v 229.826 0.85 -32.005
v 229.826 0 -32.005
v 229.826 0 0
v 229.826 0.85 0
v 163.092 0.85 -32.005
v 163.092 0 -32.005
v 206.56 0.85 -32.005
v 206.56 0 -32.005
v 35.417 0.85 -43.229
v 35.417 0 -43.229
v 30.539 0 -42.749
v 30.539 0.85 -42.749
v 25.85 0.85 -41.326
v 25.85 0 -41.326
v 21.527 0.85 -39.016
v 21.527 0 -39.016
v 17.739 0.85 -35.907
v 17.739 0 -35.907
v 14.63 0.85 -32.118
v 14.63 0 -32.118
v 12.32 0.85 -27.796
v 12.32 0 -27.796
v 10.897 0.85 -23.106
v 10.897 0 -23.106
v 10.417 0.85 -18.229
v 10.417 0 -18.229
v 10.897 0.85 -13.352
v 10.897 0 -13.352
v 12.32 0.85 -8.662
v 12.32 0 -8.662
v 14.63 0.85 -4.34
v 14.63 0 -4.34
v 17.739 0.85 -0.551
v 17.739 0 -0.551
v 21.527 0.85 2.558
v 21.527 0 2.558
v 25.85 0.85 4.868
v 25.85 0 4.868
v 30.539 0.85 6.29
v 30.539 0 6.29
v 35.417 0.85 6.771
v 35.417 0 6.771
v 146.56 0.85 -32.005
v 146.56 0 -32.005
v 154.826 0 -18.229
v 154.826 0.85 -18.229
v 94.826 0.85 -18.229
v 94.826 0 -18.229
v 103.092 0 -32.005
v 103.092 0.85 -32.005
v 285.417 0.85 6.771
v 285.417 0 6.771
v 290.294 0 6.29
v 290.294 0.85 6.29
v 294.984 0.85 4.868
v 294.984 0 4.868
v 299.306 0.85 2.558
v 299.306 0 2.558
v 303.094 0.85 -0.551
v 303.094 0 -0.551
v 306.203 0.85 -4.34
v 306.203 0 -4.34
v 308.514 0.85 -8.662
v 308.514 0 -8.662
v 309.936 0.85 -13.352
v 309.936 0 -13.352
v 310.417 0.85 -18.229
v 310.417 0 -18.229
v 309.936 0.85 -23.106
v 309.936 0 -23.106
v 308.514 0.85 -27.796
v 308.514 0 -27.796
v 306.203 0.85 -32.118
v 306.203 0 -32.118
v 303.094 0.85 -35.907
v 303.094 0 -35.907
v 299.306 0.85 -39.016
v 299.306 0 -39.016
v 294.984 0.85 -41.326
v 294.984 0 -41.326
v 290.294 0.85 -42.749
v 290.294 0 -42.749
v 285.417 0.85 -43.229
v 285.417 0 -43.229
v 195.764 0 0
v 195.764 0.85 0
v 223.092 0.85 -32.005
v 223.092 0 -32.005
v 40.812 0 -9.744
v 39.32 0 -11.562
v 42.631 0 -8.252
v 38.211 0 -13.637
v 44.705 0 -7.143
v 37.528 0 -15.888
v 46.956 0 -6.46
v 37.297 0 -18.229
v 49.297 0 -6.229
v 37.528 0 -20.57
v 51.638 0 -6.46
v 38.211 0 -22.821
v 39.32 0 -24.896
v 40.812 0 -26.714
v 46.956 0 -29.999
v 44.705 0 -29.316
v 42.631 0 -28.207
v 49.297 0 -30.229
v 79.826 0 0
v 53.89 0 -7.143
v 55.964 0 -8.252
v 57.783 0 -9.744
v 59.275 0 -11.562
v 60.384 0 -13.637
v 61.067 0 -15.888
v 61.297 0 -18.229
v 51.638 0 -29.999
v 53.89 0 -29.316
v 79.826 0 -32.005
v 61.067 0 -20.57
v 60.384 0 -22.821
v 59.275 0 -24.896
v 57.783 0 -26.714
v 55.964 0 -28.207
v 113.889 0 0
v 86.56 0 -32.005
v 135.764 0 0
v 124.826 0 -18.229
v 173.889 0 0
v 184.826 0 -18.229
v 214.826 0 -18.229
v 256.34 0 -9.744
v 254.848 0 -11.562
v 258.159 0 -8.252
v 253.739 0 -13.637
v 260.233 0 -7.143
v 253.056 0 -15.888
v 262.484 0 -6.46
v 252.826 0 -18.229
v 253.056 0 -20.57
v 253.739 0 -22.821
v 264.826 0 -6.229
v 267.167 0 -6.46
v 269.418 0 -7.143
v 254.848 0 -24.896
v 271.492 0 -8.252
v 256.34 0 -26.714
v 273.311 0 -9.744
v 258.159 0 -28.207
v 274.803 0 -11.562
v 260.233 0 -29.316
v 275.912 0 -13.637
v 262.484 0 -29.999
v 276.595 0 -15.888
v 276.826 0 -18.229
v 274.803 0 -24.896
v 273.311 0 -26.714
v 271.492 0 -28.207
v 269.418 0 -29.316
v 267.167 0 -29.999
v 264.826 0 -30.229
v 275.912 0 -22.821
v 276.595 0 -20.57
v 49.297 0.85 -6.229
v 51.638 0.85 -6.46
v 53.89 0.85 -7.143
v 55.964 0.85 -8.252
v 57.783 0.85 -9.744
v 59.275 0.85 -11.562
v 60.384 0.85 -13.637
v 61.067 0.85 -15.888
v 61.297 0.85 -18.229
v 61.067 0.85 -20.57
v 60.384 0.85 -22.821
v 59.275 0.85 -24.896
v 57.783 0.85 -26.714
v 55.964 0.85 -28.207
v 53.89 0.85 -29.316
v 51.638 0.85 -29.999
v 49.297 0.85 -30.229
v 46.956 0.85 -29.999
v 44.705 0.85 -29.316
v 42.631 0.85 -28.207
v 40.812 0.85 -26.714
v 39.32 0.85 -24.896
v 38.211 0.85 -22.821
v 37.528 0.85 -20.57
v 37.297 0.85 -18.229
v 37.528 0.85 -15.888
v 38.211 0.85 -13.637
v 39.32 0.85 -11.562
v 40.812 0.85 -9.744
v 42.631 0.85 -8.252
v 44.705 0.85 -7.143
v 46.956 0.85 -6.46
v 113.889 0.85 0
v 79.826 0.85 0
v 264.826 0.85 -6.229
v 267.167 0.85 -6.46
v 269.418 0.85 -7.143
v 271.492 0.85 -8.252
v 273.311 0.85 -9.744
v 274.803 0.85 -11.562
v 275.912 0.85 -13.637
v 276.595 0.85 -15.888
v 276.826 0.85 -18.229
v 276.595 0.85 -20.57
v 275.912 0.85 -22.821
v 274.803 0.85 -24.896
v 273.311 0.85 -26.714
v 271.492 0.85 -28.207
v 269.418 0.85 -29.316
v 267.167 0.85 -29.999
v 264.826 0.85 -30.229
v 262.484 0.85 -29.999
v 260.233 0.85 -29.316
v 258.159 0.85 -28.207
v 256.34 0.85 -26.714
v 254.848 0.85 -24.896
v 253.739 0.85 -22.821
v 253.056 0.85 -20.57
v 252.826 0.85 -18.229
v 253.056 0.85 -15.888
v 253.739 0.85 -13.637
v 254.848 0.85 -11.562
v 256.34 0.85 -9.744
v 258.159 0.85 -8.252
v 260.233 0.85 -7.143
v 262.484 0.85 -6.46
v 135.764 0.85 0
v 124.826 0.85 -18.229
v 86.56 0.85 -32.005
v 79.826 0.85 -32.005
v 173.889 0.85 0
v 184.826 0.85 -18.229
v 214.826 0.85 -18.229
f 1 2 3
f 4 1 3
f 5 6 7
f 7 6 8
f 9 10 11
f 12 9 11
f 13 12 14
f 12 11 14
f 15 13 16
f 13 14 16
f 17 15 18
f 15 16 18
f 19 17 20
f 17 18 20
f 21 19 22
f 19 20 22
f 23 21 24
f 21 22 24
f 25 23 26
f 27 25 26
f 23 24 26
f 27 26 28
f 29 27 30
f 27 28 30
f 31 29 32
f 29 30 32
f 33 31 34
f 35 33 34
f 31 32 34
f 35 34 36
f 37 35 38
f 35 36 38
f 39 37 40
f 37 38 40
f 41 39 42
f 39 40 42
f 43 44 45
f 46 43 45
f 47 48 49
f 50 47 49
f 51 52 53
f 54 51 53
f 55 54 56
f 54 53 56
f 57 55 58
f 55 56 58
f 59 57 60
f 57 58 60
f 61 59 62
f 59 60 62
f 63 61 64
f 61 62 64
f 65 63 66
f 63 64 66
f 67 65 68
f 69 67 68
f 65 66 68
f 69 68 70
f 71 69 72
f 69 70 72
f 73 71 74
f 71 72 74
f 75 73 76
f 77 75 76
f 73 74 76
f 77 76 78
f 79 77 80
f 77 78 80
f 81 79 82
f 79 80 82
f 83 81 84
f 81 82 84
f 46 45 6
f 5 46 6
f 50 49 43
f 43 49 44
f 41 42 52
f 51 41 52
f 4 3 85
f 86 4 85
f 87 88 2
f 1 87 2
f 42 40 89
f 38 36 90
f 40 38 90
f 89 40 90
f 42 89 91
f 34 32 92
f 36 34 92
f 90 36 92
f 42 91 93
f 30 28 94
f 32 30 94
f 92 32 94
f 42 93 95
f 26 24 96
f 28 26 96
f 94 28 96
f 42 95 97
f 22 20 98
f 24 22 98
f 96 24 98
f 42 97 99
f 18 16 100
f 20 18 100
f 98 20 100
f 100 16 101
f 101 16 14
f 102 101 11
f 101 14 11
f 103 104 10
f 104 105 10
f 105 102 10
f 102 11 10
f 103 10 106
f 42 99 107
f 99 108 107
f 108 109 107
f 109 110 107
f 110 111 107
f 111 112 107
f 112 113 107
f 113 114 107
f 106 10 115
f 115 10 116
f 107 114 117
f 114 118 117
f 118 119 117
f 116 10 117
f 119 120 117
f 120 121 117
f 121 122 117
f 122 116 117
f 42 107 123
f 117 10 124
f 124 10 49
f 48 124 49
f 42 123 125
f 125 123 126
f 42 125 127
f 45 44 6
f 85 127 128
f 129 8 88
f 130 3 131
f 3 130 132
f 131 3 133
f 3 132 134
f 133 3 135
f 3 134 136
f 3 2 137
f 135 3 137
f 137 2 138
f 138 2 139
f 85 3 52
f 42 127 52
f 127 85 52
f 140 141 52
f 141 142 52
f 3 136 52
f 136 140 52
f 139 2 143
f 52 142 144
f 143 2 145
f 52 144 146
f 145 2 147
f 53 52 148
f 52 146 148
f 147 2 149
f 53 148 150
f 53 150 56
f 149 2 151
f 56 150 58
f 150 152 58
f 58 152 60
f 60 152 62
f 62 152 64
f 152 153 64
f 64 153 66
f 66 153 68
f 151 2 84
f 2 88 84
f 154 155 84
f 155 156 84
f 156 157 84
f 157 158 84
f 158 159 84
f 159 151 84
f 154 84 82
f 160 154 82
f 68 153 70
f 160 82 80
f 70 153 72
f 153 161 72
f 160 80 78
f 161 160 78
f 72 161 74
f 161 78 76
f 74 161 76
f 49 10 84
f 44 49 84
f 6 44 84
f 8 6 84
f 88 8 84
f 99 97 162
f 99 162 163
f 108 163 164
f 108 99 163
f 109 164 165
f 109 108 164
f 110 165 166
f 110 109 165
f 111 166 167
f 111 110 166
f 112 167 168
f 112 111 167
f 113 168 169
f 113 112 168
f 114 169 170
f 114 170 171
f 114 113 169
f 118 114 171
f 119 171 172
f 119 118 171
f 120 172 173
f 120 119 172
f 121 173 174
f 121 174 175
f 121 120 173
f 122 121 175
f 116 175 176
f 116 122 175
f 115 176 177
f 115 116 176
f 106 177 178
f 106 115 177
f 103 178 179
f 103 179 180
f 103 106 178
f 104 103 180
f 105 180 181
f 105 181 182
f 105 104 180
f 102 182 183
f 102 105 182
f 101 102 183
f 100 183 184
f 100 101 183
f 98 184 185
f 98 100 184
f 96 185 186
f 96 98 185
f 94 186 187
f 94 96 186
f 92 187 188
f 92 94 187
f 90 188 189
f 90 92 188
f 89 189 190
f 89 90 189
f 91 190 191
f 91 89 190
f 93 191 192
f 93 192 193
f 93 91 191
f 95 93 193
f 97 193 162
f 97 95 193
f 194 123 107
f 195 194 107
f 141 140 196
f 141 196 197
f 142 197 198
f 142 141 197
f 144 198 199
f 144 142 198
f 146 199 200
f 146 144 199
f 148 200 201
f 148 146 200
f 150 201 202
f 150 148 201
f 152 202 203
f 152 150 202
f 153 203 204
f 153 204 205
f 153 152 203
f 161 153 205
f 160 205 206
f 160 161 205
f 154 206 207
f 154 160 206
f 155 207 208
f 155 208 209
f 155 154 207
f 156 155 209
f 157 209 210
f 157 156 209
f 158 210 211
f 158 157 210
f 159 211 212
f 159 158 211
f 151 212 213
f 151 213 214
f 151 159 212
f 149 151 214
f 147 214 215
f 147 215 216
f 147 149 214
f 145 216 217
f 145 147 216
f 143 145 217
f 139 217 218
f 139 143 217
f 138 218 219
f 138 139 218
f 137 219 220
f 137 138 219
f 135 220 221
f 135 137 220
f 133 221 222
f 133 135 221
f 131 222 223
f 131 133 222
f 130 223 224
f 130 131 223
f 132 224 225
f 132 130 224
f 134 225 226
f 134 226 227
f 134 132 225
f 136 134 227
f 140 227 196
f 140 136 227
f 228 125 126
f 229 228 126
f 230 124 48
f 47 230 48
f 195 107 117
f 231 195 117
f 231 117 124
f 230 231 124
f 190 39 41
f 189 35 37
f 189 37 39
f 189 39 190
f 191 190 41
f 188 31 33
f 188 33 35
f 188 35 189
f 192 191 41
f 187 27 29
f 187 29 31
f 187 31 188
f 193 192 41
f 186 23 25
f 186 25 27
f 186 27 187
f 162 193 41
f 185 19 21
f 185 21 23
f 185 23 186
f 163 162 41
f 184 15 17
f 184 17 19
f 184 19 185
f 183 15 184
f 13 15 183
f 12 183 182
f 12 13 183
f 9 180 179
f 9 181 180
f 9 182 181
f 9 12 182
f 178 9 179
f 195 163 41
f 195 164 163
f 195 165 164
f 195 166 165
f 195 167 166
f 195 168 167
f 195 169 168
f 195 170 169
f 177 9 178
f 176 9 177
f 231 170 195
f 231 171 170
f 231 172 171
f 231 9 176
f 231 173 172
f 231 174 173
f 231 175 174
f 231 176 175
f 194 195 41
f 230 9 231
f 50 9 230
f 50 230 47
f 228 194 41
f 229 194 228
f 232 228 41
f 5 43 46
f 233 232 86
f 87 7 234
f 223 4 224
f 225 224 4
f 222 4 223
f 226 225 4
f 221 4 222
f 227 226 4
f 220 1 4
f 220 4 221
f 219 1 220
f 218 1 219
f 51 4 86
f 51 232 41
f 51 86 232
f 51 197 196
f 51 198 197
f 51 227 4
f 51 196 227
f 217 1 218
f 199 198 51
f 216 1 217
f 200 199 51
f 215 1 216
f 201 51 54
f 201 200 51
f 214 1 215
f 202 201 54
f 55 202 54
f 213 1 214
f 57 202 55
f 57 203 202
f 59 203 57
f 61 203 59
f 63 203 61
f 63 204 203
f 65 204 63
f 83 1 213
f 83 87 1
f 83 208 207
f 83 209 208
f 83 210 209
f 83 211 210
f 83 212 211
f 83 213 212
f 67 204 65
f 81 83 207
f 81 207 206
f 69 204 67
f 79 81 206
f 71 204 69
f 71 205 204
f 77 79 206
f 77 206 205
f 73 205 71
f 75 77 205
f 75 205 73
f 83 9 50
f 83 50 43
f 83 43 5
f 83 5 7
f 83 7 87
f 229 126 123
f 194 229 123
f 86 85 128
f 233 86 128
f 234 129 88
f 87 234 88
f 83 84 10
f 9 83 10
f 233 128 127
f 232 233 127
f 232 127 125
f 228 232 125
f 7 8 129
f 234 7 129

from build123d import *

# Parameters (mm, degrees)
SKETCH1_R           = 12
BOSS_EXTRUDE1_DEPTH = 0.85


with BuildPart() as part:
    # Sketch1 → Boss-Extrude1 (new body)
    # profile 1 of 9: a face of its own
    with BuildSketch(Plane(origin=(0, 0, 0), x_dir=(1, 0, 0), z_dir=(0, 1, 0))):
        Polygon((103.091739333, 32.005343302), (86.560327372, 32.005343302), (94.826033353, 18.229166667), align=None)
    # profile 2 of 9: a face of its own
    with BuildSketch(Plane(origin=(0, 0, 0), x_dir=(1, 0, 0), z_dir=(0, 1, 0))):
        Polygon((124.826033353, 18.229166667), (113.888533353, 0), (135.763533353, 0), align=None)
    # profile 3 of 9: a face of its own
    with BuildSketch(Plane(origin=(0, 0, 0), x_dir=(1, 0, 0), z_dir=(0, 1, 0))):
        Polygon((163.091739333, 32.005343302), (146.560327372, 32.005343302), (154.826033353, 18.229166667), align=None)
    # profile 4 of 9: a face of its own
    with BuildSketch(Plane(origin=(0, 0, 0), x_dir=(1, 0, 0), z_dir=(0, 1, 0))):
        Polygon((173.888533353, 0), (195.763533353, 0), (184.826033353, 18.229166667), align=None)
    # profile 5 of 9: a face of its own
    with BuildSketch(Plane(origin=(0, 0, 0), x_dir=(1, 0, 0), z_dir=(0, 1, 0))):
        Polygon((214.826033353, 18.229166667), (223.091739333, 32.005343302), (206.560327372, 32.005343302), align=None)
    # profile 6 of 9: a face of its own
    with BuildSketch(Plane(origin=(0, 0, 0), x_dir=(1, 0, 0), z_dir=(0, 1, 0))):
        Polygon((229.826033353, 43.229166667), (79.826033353, 43.229166667), (79.826033353, 32.005343302), (86.560327372, 32.005343302), (103.091739333, 32.005343302), (109.826033353, 32.005343302), (116.560327372, 32.005343302), (133.091739333, 32.005343302), (139.826033353, 32.005343302), (146.560327372, 32.005343302), (163.091739333, 32.005343302), (169.826033353, 32.005343302), (176.560327372, 32.005343302), (193.091739333, 32.005343302), (199.826033353, 32.005343302), (206.560327372, 32.005343302), (223.091739333, 32.005343302), (229.826033353, 32.005343302), align=None)
    # profile 7 of 9: a face of its own
    with BuildSketch(Plane(origin=(0, 0, 0), x_dir=(1, 0, 0), z_dir=(0, 1, 0))):
        Polygon((79.826033353, 0), (79.826033353, -6.770833333), (229.826033353, -6.770833333), (229.826033353, 0), (225.763533353, 0), (203.888533353, 0), (199.826033353, 0), (195.763533353, 0), (173.888533353, 0), (169.826033353, 0), (165.763533353, 0), (143.888533353, 0), (139.826033353, 0), (135.763533353, 0), (113.888533353, 0), (109.826033353, 0), (105.763533353, 0), (83.888533353, 0), align=None)
    # profile 8 of 9: a face of its own
    with BuildSketch(Plane(origin=(0, 0, 0), x_dir=(1, 0, 0), z_dir=(0, 1, 0))):
        with BuildLine():
            Line((79.826033353, 43.229166667), (35.416666667, 43.229166667))
            ThreePointArc((35.416666667, 43.229166667), (10.416666667, 18.229166667), (35.416666667, -6.770833333))
            Line((35.416666667, -6.770833333), (79.826033353, -6.770833333))
            Line((79.826033353, -6.770833333), (79.826033353, 0))
            Line((79.826033353, 0), (79.826033353, 32.005343302))
            Line((79.826033353, 32.005343302), (79.826033353, 43.229166667))
        make_face()
        with Locations(Location((49.297410929, 18.229166667, 0), (0, 0, 270))):
            Circle(SKETCH1_R, mode=Mode.SUBTRACT)
    # profile 9 of 9: a face of its own
    with BuildSketch(Plane(origin=(0, 0, 0), x_dir=(1, 0, 0), z_dir=(0, 1, 0))):
        with BuildLine():
            Line((285.416666667, 43.229166667), (229.826033353, 43.229166667))
            Line((229.826033353, 43.229166667), (229.826033353, 32.005343302))
            Line((229.826033353, 32.005343302), (229.826033353, 0))
            Line((229.826033353, 0), (229.826033353, -6.770833333))
            Line((229.826033353, -6.770833333), (285.416666667, -6.770833333))
            ThreePointArc((285.416666667, -6.770833333), (310.416666667, 18.229166667), (285.416666667, 43.229166667))
        make_face()
        with Locations(Location((264.825532318, 18.229166667, 0), (0, 0, 270))):
            Circle(SKETCH1_R, mode=Mode.SUBTRACT)
    extrude(amount=BOSS_EXTRUDE1_DEPTH)


solid = part.part
